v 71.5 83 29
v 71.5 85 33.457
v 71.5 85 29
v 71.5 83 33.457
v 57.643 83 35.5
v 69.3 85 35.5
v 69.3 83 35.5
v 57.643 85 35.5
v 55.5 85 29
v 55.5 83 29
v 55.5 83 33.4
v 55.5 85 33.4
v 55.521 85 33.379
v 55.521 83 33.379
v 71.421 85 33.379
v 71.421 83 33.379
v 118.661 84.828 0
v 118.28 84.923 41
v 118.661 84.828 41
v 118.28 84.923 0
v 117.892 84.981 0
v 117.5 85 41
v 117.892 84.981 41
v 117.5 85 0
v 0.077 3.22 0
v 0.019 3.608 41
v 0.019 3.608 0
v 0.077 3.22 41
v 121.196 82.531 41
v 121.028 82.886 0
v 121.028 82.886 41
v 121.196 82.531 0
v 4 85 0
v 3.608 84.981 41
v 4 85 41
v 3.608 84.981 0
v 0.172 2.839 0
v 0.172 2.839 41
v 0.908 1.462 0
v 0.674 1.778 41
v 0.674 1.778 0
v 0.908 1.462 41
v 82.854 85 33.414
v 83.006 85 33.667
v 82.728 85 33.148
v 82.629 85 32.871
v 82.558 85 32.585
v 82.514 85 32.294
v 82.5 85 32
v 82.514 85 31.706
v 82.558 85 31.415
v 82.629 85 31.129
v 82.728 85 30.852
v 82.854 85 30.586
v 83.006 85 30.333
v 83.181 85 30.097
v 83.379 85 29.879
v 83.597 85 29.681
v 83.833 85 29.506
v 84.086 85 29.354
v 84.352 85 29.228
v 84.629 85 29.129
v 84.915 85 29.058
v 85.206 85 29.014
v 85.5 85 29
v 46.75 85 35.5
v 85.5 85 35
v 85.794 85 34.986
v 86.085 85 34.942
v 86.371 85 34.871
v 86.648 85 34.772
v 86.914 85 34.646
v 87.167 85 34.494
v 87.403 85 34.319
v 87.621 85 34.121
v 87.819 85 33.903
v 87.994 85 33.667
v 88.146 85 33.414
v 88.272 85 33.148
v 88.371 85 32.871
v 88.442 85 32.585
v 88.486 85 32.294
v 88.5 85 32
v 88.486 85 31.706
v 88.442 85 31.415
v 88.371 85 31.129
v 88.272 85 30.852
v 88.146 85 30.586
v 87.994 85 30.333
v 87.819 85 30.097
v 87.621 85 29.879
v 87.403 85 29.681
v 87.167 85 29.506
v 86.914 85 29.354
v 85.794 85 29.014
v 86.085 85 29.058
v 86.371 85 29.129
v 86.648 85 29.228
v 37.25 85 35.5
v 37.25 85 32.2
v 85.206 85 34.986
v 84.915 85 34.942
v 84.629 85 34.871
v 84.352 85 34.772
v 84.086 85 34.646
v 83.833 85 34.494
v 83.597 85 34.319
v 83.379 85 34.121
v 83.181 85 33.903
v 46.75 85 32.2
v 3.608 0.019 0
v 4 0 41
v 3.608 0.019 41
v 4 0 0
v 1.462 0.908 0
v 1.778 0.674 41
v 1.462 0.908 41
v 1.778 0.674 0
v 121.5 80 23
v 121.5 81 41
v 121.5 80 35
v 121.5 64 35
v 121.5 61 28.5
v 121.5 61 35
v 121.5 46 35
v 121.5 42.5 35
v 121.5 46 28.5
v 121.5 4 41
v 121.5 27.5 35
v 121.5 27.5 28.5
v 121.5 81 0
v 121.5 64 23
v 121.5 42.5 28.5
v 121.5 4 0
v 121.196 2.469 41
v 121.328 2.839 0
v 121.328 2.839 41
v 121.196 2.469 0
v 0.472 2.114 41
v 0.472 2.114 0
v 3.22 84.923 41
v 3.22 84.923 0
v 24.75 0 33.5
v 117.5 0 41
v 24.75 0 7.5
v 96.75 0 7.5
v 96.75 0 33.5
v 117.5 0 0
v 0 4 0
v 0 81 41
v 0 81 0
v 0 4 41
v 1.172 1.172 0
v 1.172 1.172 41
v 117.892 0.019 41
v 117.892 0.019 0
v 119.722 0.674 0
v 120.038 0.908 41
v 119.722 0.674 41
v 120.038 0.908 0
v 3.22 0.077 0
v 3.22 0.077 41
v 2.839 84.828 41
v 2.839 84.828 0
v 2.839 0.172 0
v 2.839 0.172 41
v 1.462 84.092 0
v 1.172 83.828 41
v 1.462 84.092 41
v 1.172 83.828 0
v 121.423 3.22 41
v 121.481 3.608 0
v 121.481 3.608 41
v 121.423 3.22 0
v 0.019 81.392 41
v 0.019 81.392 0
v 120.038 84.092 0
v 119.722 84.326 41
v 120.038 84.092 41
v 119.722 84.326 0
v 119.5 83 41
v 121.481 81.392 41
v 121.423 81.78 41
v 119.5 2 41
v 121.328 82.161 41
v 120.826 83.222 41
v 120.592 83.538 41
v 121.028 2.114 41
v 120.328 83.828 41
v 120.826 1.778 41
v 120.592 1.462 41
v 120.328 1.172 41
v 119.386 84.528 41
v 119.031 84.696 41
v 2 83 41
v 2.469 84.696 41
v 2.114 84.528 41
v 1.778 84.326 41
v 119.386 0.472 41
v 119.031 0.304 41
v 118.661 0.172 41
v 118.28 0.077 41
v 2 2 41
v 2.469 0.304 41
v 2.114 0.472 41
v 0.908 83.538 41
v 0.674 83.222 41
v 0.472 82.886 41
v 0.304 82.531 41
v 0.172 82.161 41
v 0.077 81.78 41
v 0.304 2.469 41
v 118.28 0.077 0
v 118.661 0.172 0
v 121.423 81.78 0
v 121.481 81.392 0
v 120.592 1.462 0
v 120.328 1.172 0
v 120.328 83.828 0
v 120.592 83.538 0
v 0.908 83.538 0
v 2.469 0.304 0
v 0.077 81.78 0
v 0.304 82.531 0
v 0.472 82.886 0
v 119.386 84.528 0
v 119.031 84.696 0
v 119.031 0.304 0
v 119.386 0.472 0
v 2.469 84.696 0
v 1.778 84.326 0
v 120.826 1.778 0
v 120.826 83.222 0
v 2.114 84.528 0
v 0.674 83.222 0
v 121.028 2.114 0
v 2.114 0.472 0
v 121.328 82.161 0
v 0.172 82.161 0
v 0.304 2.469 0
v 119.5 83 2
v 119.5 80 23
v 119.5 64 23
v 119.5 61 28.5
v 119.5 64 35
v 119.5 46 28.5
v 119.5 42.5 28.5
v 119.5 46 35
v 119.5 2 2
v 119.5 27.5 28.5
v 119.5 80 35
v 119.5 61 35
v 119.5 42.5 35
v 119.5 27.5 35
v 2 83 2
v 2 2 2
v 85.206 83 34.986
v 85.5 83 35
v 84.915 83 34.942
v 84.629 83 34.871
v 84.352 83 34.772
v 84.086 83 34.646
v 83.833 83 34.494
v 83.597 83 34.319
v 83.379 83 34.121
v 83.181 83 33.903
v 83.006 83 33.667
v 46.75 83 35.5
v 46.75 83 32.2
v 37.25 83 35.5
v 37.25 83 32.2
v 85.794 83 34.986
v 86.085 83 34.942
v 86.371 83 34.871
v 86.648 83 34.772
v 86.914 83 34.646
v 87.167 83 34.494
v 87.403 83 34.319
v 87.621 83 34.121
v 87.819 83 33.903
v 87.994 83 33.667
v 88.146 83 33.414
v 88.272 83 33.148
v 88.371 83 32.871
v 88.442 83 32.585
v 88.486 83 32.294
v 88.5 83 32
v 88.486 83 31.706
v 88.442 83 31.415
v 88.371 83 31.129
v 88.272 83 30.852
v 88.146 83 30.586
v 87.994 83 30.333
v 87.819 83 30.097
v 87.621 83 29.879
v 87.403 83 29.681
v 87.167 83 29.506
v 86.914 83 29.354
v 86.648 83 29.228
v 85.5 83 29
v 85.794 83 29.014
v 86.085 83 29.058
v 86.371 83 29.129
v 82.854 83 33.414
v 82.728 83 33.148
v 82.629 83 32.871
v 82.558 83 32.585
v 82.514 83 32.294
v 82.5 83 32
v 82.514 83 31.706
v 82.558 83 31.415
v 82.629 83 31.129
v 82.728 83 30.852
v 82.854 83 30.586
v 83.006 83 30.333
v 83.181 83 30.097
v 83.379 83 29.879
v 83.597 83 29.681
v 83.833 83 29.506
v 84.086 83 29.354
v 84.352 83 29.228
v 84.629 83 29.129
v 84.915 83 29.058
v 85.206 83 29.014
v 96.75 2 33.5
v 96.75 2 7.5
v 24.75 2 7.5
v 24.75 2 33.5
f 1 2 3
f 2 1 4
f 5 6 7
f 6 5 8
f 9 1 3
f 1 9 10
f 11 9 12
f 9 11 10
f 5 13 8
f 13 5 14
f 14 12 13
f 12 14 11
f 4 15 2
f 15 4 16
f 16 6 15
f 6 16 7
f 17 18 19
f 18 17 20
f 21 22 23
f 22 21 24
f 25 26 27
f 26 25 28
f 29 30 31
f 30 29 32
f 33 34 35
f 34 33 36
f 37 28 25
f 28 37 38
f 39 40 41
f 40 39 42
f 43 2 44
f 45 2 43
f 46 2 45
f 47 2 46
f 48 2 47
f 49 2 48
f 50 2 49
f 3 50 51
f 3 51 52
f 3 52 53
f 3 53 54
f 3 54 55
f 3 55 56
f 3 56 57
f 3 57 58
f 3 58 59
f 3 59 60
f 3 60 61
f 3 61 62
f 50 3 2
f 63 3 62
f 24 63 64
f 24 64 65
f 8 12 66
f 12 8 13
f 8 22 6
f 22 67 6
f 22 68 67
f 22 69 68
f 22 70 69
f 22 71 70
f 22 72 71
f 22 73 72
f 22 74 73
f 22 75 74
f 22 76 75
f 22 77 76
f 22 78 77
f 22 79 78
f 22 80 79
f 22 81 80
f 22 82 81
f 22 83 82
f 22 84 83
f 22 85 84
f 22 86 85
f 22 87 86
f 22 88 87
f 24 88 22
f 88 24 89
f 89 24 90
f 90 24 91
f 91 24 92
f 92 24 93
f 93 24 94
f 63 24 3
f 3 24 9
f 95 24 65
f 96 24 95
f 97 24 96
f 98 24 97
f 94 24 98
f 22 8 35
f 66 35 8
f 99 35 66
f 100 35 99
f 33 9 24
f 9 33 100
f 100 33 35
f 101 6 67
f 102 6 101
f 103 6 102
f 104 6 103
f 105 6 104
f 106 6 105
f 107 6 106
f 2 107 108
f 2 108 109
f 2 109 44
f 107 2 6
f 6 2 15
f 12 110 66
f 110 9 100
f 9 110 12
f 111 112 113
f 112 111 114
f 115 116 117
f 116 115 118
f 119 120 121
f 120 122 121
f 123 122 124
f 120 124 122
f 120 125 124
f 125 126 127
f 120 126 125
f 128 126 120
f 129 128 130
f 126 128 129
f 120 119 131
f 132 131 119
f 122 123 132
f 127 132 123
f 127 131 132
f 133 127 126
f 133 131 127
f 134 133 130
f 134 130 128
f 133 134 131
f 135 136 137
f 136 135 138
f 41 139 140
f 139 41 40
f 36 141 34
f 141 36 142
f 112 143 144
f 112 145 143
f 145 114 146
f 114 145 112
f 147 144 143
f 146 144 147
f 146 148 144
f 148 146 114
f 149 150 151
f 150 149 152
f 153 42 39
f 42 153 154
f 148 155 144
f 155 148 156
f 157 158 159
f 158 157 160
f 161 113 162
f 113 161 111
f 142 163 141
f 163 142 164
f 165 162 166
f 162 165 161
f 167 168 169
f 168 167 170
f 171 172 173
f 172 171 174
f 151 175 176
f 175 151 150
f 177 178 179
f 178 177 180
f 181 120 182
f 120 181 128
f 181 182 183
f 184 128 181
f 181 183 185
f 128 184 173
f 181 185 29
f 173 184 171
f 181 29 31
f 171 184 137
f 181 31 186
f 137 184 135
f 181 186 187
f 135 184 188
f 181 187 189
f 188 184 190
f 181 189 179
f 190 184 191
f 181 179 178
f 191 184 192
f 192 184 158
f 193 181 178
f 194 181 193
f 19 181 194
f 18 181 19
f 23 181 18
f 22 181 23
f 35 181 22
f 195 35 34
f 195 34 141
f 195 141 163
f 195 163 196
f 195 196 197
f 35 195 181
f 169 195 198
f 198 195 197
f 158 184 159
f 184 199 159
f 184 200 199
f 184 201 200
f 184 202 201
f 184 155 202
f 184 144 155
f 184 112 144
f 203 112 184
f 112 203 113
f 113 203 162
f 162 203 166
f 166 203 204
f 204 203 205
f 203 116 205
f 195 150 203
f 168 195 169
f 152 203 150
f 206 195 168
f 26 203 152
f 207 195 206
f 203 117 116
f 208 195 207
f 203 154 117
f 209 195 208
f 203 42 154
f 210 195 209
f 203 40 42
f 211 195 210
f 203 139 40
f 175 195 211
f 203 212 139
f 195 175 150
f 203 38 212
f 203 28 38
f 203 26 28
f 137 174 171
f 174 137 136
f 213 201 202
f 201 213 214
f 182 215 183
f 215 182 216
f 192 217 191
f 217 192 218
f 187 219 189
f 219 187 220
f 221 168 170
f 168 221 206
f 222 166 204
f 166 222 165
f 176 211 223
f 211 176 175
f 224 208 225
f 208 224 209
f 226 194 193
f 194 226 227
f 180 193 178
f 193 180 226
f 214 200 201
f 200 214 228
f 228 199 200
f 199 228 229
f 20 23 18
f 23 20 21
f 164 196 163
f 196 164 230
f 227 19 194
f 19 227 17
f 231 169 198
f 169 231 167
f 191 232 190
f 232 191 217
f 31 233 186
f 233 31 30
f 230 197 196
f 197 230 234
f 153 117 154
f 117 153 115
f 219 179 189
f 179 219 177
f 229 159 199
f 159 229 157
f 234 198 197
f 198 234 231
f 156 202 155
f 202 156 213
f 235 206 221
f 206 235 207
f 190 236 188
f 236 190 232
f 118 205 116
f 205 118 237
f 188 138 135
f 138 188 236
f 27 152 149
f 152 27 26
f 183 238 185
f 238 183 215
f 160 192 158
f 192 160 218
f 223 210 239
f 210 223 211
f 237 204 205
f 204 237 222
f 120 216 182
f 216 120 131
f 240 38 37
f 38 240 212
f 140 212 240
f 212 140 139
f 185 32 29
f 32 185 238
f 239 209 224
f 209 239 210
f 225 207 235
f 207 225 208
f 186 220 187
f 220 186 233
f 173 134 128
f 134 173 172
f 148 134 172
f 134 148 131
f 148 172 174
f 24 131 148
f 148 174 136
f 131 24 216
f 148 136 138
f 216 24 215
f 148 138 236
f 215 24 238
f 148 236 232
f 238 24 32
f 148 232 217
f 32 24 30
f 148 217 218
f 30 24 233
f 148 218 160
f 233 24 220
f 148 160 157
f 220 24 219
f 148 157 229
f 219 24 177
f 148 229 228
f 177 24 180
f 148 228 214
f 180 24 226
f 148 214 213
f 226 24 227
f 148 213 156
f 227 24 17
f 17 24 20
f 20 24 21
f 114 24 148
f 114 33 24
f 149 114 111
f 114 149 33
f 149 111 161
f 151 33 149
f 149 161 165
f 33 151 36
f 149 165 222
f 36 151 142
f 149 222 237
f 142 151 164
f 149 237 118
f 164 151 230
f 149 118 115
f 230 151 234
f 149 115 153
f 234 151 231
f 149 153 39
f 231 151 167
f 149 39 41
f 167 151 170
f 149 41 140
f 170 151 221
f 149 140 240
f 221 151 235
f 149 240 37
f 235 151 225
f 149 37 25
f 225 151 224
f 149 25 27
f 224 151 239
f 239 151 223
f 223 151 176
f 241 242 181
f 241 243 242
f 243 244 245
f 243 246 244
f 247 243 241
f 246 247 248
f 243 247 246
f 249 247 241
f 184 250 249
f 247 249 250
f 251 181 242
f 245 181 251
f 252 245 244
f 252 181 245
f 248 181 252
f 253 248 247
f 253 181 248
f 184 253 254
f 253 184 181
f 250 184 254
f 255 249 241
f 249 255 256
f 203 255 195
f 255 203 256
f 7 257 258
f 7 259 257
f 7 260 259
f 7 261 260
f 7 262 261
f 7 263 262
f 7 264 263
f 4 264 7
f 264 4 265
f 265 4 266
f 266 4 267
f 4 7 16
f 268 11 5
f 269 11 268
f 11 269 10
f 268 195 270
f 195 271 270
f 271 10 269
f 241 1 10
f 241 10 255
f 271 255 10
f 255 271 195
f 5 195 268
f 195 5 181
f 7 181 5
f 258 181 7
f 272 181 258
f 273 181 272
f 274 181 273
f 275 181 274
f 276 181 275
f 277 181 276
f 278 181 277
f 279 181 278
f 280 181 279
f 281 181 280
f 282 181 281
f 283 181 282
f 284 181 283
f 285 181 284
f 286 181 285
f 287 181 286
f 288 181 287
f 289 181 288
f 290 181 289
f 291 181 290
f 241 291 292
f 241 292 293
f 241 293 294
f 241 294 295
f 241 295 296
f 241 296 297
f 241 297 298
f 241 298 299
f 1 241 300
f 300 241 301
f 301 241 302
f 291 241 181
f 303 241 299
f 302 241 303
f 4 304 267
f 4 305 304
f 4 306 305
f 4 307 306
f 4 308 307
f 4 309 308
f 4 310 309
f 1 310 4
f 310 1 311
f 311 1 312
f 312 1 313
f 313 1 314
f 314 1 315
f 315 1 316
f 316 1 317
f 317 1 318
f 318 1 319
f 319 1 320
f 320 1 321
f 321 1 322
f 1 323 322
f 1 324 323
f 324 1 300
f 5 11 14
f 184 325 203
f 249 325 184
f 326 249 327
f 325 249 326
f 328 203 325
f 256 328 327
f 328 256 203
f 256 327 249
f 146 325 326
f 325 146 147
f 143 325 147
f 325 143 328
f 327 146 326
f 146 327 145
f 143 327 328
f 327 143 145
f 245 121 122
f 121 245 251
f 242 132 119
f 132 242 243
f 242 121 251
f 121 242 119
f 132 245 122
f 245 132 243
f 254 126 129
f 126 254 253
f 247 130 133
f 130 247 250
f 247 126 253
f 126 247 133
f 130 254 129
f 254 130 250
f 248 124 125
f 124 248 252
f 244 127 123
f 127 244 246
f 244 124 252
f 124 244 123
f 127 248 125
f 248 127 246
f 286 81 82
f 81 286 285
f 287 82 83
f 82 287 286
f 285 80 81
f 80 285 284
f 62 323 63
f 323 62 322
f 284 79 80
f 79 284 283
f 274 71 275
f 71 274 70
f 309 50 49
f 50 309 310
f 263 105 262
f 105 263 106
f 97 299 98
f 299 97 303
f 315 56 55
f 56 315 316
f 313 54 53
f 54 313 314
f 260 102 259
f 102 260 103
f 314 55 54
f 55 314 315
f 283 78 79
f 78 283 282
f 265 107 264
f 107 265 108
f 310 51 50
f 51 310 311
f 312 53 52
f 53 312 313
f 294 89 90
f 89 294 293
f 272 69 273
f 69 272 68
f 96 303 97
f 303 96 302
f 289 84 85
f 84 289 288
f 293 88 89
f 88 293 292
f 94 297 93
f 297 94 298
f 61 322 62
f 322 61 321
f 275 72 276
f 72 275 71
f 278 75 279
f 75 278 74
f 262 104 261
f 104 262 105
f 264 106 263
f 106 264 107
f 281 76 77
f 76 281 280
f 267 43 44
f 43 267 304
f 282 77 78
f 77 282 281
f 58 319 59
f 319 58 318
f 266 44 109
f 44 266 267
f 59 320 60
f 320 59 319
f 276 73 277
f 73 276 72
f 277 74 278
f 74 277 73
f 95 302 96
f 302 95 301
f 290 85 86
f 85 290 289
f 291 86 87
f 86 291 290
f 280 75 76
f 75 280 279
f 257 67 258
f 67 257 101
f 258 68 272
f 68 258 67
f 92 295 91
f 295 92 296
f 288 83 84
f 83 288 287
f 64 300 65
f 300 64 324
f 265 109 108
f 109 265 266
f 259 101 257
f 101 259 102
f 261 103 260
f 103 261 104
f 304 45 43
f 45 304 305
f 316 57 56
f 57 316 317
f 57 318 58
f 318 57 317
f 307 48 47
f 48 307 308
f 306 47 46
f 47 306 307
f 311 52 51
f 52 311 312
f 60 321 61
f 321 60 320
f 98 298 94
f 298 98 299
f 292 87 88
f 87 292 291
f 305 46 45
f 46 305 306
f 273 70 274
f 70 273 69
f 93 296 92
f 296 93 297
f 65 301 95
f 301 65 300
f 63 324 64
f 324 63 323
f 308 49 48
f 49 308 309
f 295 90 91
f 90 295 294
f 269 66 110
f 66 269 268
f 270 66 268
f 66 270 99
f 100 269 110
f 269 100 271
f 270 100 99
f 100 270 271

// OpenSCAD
//number of fragments
$fn=64;

difference(){
    // outer shell
    roundedcube(121.50,85,41,4);

    // internal cavity
    translate([2,2,2]){
        cube([117.5,81,40]);
    }

    // oled window
    translate([24.75,-1,7.50]){
        cube([72,4,26]);
    }

    // ethernet
    translate([118,64,23]){
        cube([4,16,12]) ;
    }

    // usb ports
    translate([118,27.50,28.50]){
        cube([4,15,6.50]);
    }
    translate([118,46,28.50]){
        cube([4,15,6.50]);
    }

    // A/V jack
    translate([85.50,86,32]){
        rotate([90,0,0]){
            cylinder(h=4,r=3);
        }
    }

    // hdmi
    translate([55.50,82,29]){
        difference(){
            cube([16,4,6.50]);
            translate([-2.10,0,6.50]){
                rotate([0,45,0]){
                    cube([3,4,3]);
                }
            }
            translate([13.8,0,6.50]){
                rotate([0,45,0]){
                    cube([3,4,3]);
                }
            }
        }
    }

    // power connector
    translate([37.25,82,32.20]){
        cube([9.50,4,3.30]) ;
    }
}

module roundedcube(xdim,ydim,zdim,rdim){
    hull(){
        translate([rdim,rdim,0])cylinder(r=rdim,h=zdim);
        translate([xdim-rdim,rdim,0])cylinder(r=rdim,h=zdim);
        translate([rdim,ydim-rdim,0])cylinder(r=rdim,h=zdim);
        translate([xdim-rdim,ydim-rdim,0])cylinder(r=rdim,h=zdim);
    }
}
